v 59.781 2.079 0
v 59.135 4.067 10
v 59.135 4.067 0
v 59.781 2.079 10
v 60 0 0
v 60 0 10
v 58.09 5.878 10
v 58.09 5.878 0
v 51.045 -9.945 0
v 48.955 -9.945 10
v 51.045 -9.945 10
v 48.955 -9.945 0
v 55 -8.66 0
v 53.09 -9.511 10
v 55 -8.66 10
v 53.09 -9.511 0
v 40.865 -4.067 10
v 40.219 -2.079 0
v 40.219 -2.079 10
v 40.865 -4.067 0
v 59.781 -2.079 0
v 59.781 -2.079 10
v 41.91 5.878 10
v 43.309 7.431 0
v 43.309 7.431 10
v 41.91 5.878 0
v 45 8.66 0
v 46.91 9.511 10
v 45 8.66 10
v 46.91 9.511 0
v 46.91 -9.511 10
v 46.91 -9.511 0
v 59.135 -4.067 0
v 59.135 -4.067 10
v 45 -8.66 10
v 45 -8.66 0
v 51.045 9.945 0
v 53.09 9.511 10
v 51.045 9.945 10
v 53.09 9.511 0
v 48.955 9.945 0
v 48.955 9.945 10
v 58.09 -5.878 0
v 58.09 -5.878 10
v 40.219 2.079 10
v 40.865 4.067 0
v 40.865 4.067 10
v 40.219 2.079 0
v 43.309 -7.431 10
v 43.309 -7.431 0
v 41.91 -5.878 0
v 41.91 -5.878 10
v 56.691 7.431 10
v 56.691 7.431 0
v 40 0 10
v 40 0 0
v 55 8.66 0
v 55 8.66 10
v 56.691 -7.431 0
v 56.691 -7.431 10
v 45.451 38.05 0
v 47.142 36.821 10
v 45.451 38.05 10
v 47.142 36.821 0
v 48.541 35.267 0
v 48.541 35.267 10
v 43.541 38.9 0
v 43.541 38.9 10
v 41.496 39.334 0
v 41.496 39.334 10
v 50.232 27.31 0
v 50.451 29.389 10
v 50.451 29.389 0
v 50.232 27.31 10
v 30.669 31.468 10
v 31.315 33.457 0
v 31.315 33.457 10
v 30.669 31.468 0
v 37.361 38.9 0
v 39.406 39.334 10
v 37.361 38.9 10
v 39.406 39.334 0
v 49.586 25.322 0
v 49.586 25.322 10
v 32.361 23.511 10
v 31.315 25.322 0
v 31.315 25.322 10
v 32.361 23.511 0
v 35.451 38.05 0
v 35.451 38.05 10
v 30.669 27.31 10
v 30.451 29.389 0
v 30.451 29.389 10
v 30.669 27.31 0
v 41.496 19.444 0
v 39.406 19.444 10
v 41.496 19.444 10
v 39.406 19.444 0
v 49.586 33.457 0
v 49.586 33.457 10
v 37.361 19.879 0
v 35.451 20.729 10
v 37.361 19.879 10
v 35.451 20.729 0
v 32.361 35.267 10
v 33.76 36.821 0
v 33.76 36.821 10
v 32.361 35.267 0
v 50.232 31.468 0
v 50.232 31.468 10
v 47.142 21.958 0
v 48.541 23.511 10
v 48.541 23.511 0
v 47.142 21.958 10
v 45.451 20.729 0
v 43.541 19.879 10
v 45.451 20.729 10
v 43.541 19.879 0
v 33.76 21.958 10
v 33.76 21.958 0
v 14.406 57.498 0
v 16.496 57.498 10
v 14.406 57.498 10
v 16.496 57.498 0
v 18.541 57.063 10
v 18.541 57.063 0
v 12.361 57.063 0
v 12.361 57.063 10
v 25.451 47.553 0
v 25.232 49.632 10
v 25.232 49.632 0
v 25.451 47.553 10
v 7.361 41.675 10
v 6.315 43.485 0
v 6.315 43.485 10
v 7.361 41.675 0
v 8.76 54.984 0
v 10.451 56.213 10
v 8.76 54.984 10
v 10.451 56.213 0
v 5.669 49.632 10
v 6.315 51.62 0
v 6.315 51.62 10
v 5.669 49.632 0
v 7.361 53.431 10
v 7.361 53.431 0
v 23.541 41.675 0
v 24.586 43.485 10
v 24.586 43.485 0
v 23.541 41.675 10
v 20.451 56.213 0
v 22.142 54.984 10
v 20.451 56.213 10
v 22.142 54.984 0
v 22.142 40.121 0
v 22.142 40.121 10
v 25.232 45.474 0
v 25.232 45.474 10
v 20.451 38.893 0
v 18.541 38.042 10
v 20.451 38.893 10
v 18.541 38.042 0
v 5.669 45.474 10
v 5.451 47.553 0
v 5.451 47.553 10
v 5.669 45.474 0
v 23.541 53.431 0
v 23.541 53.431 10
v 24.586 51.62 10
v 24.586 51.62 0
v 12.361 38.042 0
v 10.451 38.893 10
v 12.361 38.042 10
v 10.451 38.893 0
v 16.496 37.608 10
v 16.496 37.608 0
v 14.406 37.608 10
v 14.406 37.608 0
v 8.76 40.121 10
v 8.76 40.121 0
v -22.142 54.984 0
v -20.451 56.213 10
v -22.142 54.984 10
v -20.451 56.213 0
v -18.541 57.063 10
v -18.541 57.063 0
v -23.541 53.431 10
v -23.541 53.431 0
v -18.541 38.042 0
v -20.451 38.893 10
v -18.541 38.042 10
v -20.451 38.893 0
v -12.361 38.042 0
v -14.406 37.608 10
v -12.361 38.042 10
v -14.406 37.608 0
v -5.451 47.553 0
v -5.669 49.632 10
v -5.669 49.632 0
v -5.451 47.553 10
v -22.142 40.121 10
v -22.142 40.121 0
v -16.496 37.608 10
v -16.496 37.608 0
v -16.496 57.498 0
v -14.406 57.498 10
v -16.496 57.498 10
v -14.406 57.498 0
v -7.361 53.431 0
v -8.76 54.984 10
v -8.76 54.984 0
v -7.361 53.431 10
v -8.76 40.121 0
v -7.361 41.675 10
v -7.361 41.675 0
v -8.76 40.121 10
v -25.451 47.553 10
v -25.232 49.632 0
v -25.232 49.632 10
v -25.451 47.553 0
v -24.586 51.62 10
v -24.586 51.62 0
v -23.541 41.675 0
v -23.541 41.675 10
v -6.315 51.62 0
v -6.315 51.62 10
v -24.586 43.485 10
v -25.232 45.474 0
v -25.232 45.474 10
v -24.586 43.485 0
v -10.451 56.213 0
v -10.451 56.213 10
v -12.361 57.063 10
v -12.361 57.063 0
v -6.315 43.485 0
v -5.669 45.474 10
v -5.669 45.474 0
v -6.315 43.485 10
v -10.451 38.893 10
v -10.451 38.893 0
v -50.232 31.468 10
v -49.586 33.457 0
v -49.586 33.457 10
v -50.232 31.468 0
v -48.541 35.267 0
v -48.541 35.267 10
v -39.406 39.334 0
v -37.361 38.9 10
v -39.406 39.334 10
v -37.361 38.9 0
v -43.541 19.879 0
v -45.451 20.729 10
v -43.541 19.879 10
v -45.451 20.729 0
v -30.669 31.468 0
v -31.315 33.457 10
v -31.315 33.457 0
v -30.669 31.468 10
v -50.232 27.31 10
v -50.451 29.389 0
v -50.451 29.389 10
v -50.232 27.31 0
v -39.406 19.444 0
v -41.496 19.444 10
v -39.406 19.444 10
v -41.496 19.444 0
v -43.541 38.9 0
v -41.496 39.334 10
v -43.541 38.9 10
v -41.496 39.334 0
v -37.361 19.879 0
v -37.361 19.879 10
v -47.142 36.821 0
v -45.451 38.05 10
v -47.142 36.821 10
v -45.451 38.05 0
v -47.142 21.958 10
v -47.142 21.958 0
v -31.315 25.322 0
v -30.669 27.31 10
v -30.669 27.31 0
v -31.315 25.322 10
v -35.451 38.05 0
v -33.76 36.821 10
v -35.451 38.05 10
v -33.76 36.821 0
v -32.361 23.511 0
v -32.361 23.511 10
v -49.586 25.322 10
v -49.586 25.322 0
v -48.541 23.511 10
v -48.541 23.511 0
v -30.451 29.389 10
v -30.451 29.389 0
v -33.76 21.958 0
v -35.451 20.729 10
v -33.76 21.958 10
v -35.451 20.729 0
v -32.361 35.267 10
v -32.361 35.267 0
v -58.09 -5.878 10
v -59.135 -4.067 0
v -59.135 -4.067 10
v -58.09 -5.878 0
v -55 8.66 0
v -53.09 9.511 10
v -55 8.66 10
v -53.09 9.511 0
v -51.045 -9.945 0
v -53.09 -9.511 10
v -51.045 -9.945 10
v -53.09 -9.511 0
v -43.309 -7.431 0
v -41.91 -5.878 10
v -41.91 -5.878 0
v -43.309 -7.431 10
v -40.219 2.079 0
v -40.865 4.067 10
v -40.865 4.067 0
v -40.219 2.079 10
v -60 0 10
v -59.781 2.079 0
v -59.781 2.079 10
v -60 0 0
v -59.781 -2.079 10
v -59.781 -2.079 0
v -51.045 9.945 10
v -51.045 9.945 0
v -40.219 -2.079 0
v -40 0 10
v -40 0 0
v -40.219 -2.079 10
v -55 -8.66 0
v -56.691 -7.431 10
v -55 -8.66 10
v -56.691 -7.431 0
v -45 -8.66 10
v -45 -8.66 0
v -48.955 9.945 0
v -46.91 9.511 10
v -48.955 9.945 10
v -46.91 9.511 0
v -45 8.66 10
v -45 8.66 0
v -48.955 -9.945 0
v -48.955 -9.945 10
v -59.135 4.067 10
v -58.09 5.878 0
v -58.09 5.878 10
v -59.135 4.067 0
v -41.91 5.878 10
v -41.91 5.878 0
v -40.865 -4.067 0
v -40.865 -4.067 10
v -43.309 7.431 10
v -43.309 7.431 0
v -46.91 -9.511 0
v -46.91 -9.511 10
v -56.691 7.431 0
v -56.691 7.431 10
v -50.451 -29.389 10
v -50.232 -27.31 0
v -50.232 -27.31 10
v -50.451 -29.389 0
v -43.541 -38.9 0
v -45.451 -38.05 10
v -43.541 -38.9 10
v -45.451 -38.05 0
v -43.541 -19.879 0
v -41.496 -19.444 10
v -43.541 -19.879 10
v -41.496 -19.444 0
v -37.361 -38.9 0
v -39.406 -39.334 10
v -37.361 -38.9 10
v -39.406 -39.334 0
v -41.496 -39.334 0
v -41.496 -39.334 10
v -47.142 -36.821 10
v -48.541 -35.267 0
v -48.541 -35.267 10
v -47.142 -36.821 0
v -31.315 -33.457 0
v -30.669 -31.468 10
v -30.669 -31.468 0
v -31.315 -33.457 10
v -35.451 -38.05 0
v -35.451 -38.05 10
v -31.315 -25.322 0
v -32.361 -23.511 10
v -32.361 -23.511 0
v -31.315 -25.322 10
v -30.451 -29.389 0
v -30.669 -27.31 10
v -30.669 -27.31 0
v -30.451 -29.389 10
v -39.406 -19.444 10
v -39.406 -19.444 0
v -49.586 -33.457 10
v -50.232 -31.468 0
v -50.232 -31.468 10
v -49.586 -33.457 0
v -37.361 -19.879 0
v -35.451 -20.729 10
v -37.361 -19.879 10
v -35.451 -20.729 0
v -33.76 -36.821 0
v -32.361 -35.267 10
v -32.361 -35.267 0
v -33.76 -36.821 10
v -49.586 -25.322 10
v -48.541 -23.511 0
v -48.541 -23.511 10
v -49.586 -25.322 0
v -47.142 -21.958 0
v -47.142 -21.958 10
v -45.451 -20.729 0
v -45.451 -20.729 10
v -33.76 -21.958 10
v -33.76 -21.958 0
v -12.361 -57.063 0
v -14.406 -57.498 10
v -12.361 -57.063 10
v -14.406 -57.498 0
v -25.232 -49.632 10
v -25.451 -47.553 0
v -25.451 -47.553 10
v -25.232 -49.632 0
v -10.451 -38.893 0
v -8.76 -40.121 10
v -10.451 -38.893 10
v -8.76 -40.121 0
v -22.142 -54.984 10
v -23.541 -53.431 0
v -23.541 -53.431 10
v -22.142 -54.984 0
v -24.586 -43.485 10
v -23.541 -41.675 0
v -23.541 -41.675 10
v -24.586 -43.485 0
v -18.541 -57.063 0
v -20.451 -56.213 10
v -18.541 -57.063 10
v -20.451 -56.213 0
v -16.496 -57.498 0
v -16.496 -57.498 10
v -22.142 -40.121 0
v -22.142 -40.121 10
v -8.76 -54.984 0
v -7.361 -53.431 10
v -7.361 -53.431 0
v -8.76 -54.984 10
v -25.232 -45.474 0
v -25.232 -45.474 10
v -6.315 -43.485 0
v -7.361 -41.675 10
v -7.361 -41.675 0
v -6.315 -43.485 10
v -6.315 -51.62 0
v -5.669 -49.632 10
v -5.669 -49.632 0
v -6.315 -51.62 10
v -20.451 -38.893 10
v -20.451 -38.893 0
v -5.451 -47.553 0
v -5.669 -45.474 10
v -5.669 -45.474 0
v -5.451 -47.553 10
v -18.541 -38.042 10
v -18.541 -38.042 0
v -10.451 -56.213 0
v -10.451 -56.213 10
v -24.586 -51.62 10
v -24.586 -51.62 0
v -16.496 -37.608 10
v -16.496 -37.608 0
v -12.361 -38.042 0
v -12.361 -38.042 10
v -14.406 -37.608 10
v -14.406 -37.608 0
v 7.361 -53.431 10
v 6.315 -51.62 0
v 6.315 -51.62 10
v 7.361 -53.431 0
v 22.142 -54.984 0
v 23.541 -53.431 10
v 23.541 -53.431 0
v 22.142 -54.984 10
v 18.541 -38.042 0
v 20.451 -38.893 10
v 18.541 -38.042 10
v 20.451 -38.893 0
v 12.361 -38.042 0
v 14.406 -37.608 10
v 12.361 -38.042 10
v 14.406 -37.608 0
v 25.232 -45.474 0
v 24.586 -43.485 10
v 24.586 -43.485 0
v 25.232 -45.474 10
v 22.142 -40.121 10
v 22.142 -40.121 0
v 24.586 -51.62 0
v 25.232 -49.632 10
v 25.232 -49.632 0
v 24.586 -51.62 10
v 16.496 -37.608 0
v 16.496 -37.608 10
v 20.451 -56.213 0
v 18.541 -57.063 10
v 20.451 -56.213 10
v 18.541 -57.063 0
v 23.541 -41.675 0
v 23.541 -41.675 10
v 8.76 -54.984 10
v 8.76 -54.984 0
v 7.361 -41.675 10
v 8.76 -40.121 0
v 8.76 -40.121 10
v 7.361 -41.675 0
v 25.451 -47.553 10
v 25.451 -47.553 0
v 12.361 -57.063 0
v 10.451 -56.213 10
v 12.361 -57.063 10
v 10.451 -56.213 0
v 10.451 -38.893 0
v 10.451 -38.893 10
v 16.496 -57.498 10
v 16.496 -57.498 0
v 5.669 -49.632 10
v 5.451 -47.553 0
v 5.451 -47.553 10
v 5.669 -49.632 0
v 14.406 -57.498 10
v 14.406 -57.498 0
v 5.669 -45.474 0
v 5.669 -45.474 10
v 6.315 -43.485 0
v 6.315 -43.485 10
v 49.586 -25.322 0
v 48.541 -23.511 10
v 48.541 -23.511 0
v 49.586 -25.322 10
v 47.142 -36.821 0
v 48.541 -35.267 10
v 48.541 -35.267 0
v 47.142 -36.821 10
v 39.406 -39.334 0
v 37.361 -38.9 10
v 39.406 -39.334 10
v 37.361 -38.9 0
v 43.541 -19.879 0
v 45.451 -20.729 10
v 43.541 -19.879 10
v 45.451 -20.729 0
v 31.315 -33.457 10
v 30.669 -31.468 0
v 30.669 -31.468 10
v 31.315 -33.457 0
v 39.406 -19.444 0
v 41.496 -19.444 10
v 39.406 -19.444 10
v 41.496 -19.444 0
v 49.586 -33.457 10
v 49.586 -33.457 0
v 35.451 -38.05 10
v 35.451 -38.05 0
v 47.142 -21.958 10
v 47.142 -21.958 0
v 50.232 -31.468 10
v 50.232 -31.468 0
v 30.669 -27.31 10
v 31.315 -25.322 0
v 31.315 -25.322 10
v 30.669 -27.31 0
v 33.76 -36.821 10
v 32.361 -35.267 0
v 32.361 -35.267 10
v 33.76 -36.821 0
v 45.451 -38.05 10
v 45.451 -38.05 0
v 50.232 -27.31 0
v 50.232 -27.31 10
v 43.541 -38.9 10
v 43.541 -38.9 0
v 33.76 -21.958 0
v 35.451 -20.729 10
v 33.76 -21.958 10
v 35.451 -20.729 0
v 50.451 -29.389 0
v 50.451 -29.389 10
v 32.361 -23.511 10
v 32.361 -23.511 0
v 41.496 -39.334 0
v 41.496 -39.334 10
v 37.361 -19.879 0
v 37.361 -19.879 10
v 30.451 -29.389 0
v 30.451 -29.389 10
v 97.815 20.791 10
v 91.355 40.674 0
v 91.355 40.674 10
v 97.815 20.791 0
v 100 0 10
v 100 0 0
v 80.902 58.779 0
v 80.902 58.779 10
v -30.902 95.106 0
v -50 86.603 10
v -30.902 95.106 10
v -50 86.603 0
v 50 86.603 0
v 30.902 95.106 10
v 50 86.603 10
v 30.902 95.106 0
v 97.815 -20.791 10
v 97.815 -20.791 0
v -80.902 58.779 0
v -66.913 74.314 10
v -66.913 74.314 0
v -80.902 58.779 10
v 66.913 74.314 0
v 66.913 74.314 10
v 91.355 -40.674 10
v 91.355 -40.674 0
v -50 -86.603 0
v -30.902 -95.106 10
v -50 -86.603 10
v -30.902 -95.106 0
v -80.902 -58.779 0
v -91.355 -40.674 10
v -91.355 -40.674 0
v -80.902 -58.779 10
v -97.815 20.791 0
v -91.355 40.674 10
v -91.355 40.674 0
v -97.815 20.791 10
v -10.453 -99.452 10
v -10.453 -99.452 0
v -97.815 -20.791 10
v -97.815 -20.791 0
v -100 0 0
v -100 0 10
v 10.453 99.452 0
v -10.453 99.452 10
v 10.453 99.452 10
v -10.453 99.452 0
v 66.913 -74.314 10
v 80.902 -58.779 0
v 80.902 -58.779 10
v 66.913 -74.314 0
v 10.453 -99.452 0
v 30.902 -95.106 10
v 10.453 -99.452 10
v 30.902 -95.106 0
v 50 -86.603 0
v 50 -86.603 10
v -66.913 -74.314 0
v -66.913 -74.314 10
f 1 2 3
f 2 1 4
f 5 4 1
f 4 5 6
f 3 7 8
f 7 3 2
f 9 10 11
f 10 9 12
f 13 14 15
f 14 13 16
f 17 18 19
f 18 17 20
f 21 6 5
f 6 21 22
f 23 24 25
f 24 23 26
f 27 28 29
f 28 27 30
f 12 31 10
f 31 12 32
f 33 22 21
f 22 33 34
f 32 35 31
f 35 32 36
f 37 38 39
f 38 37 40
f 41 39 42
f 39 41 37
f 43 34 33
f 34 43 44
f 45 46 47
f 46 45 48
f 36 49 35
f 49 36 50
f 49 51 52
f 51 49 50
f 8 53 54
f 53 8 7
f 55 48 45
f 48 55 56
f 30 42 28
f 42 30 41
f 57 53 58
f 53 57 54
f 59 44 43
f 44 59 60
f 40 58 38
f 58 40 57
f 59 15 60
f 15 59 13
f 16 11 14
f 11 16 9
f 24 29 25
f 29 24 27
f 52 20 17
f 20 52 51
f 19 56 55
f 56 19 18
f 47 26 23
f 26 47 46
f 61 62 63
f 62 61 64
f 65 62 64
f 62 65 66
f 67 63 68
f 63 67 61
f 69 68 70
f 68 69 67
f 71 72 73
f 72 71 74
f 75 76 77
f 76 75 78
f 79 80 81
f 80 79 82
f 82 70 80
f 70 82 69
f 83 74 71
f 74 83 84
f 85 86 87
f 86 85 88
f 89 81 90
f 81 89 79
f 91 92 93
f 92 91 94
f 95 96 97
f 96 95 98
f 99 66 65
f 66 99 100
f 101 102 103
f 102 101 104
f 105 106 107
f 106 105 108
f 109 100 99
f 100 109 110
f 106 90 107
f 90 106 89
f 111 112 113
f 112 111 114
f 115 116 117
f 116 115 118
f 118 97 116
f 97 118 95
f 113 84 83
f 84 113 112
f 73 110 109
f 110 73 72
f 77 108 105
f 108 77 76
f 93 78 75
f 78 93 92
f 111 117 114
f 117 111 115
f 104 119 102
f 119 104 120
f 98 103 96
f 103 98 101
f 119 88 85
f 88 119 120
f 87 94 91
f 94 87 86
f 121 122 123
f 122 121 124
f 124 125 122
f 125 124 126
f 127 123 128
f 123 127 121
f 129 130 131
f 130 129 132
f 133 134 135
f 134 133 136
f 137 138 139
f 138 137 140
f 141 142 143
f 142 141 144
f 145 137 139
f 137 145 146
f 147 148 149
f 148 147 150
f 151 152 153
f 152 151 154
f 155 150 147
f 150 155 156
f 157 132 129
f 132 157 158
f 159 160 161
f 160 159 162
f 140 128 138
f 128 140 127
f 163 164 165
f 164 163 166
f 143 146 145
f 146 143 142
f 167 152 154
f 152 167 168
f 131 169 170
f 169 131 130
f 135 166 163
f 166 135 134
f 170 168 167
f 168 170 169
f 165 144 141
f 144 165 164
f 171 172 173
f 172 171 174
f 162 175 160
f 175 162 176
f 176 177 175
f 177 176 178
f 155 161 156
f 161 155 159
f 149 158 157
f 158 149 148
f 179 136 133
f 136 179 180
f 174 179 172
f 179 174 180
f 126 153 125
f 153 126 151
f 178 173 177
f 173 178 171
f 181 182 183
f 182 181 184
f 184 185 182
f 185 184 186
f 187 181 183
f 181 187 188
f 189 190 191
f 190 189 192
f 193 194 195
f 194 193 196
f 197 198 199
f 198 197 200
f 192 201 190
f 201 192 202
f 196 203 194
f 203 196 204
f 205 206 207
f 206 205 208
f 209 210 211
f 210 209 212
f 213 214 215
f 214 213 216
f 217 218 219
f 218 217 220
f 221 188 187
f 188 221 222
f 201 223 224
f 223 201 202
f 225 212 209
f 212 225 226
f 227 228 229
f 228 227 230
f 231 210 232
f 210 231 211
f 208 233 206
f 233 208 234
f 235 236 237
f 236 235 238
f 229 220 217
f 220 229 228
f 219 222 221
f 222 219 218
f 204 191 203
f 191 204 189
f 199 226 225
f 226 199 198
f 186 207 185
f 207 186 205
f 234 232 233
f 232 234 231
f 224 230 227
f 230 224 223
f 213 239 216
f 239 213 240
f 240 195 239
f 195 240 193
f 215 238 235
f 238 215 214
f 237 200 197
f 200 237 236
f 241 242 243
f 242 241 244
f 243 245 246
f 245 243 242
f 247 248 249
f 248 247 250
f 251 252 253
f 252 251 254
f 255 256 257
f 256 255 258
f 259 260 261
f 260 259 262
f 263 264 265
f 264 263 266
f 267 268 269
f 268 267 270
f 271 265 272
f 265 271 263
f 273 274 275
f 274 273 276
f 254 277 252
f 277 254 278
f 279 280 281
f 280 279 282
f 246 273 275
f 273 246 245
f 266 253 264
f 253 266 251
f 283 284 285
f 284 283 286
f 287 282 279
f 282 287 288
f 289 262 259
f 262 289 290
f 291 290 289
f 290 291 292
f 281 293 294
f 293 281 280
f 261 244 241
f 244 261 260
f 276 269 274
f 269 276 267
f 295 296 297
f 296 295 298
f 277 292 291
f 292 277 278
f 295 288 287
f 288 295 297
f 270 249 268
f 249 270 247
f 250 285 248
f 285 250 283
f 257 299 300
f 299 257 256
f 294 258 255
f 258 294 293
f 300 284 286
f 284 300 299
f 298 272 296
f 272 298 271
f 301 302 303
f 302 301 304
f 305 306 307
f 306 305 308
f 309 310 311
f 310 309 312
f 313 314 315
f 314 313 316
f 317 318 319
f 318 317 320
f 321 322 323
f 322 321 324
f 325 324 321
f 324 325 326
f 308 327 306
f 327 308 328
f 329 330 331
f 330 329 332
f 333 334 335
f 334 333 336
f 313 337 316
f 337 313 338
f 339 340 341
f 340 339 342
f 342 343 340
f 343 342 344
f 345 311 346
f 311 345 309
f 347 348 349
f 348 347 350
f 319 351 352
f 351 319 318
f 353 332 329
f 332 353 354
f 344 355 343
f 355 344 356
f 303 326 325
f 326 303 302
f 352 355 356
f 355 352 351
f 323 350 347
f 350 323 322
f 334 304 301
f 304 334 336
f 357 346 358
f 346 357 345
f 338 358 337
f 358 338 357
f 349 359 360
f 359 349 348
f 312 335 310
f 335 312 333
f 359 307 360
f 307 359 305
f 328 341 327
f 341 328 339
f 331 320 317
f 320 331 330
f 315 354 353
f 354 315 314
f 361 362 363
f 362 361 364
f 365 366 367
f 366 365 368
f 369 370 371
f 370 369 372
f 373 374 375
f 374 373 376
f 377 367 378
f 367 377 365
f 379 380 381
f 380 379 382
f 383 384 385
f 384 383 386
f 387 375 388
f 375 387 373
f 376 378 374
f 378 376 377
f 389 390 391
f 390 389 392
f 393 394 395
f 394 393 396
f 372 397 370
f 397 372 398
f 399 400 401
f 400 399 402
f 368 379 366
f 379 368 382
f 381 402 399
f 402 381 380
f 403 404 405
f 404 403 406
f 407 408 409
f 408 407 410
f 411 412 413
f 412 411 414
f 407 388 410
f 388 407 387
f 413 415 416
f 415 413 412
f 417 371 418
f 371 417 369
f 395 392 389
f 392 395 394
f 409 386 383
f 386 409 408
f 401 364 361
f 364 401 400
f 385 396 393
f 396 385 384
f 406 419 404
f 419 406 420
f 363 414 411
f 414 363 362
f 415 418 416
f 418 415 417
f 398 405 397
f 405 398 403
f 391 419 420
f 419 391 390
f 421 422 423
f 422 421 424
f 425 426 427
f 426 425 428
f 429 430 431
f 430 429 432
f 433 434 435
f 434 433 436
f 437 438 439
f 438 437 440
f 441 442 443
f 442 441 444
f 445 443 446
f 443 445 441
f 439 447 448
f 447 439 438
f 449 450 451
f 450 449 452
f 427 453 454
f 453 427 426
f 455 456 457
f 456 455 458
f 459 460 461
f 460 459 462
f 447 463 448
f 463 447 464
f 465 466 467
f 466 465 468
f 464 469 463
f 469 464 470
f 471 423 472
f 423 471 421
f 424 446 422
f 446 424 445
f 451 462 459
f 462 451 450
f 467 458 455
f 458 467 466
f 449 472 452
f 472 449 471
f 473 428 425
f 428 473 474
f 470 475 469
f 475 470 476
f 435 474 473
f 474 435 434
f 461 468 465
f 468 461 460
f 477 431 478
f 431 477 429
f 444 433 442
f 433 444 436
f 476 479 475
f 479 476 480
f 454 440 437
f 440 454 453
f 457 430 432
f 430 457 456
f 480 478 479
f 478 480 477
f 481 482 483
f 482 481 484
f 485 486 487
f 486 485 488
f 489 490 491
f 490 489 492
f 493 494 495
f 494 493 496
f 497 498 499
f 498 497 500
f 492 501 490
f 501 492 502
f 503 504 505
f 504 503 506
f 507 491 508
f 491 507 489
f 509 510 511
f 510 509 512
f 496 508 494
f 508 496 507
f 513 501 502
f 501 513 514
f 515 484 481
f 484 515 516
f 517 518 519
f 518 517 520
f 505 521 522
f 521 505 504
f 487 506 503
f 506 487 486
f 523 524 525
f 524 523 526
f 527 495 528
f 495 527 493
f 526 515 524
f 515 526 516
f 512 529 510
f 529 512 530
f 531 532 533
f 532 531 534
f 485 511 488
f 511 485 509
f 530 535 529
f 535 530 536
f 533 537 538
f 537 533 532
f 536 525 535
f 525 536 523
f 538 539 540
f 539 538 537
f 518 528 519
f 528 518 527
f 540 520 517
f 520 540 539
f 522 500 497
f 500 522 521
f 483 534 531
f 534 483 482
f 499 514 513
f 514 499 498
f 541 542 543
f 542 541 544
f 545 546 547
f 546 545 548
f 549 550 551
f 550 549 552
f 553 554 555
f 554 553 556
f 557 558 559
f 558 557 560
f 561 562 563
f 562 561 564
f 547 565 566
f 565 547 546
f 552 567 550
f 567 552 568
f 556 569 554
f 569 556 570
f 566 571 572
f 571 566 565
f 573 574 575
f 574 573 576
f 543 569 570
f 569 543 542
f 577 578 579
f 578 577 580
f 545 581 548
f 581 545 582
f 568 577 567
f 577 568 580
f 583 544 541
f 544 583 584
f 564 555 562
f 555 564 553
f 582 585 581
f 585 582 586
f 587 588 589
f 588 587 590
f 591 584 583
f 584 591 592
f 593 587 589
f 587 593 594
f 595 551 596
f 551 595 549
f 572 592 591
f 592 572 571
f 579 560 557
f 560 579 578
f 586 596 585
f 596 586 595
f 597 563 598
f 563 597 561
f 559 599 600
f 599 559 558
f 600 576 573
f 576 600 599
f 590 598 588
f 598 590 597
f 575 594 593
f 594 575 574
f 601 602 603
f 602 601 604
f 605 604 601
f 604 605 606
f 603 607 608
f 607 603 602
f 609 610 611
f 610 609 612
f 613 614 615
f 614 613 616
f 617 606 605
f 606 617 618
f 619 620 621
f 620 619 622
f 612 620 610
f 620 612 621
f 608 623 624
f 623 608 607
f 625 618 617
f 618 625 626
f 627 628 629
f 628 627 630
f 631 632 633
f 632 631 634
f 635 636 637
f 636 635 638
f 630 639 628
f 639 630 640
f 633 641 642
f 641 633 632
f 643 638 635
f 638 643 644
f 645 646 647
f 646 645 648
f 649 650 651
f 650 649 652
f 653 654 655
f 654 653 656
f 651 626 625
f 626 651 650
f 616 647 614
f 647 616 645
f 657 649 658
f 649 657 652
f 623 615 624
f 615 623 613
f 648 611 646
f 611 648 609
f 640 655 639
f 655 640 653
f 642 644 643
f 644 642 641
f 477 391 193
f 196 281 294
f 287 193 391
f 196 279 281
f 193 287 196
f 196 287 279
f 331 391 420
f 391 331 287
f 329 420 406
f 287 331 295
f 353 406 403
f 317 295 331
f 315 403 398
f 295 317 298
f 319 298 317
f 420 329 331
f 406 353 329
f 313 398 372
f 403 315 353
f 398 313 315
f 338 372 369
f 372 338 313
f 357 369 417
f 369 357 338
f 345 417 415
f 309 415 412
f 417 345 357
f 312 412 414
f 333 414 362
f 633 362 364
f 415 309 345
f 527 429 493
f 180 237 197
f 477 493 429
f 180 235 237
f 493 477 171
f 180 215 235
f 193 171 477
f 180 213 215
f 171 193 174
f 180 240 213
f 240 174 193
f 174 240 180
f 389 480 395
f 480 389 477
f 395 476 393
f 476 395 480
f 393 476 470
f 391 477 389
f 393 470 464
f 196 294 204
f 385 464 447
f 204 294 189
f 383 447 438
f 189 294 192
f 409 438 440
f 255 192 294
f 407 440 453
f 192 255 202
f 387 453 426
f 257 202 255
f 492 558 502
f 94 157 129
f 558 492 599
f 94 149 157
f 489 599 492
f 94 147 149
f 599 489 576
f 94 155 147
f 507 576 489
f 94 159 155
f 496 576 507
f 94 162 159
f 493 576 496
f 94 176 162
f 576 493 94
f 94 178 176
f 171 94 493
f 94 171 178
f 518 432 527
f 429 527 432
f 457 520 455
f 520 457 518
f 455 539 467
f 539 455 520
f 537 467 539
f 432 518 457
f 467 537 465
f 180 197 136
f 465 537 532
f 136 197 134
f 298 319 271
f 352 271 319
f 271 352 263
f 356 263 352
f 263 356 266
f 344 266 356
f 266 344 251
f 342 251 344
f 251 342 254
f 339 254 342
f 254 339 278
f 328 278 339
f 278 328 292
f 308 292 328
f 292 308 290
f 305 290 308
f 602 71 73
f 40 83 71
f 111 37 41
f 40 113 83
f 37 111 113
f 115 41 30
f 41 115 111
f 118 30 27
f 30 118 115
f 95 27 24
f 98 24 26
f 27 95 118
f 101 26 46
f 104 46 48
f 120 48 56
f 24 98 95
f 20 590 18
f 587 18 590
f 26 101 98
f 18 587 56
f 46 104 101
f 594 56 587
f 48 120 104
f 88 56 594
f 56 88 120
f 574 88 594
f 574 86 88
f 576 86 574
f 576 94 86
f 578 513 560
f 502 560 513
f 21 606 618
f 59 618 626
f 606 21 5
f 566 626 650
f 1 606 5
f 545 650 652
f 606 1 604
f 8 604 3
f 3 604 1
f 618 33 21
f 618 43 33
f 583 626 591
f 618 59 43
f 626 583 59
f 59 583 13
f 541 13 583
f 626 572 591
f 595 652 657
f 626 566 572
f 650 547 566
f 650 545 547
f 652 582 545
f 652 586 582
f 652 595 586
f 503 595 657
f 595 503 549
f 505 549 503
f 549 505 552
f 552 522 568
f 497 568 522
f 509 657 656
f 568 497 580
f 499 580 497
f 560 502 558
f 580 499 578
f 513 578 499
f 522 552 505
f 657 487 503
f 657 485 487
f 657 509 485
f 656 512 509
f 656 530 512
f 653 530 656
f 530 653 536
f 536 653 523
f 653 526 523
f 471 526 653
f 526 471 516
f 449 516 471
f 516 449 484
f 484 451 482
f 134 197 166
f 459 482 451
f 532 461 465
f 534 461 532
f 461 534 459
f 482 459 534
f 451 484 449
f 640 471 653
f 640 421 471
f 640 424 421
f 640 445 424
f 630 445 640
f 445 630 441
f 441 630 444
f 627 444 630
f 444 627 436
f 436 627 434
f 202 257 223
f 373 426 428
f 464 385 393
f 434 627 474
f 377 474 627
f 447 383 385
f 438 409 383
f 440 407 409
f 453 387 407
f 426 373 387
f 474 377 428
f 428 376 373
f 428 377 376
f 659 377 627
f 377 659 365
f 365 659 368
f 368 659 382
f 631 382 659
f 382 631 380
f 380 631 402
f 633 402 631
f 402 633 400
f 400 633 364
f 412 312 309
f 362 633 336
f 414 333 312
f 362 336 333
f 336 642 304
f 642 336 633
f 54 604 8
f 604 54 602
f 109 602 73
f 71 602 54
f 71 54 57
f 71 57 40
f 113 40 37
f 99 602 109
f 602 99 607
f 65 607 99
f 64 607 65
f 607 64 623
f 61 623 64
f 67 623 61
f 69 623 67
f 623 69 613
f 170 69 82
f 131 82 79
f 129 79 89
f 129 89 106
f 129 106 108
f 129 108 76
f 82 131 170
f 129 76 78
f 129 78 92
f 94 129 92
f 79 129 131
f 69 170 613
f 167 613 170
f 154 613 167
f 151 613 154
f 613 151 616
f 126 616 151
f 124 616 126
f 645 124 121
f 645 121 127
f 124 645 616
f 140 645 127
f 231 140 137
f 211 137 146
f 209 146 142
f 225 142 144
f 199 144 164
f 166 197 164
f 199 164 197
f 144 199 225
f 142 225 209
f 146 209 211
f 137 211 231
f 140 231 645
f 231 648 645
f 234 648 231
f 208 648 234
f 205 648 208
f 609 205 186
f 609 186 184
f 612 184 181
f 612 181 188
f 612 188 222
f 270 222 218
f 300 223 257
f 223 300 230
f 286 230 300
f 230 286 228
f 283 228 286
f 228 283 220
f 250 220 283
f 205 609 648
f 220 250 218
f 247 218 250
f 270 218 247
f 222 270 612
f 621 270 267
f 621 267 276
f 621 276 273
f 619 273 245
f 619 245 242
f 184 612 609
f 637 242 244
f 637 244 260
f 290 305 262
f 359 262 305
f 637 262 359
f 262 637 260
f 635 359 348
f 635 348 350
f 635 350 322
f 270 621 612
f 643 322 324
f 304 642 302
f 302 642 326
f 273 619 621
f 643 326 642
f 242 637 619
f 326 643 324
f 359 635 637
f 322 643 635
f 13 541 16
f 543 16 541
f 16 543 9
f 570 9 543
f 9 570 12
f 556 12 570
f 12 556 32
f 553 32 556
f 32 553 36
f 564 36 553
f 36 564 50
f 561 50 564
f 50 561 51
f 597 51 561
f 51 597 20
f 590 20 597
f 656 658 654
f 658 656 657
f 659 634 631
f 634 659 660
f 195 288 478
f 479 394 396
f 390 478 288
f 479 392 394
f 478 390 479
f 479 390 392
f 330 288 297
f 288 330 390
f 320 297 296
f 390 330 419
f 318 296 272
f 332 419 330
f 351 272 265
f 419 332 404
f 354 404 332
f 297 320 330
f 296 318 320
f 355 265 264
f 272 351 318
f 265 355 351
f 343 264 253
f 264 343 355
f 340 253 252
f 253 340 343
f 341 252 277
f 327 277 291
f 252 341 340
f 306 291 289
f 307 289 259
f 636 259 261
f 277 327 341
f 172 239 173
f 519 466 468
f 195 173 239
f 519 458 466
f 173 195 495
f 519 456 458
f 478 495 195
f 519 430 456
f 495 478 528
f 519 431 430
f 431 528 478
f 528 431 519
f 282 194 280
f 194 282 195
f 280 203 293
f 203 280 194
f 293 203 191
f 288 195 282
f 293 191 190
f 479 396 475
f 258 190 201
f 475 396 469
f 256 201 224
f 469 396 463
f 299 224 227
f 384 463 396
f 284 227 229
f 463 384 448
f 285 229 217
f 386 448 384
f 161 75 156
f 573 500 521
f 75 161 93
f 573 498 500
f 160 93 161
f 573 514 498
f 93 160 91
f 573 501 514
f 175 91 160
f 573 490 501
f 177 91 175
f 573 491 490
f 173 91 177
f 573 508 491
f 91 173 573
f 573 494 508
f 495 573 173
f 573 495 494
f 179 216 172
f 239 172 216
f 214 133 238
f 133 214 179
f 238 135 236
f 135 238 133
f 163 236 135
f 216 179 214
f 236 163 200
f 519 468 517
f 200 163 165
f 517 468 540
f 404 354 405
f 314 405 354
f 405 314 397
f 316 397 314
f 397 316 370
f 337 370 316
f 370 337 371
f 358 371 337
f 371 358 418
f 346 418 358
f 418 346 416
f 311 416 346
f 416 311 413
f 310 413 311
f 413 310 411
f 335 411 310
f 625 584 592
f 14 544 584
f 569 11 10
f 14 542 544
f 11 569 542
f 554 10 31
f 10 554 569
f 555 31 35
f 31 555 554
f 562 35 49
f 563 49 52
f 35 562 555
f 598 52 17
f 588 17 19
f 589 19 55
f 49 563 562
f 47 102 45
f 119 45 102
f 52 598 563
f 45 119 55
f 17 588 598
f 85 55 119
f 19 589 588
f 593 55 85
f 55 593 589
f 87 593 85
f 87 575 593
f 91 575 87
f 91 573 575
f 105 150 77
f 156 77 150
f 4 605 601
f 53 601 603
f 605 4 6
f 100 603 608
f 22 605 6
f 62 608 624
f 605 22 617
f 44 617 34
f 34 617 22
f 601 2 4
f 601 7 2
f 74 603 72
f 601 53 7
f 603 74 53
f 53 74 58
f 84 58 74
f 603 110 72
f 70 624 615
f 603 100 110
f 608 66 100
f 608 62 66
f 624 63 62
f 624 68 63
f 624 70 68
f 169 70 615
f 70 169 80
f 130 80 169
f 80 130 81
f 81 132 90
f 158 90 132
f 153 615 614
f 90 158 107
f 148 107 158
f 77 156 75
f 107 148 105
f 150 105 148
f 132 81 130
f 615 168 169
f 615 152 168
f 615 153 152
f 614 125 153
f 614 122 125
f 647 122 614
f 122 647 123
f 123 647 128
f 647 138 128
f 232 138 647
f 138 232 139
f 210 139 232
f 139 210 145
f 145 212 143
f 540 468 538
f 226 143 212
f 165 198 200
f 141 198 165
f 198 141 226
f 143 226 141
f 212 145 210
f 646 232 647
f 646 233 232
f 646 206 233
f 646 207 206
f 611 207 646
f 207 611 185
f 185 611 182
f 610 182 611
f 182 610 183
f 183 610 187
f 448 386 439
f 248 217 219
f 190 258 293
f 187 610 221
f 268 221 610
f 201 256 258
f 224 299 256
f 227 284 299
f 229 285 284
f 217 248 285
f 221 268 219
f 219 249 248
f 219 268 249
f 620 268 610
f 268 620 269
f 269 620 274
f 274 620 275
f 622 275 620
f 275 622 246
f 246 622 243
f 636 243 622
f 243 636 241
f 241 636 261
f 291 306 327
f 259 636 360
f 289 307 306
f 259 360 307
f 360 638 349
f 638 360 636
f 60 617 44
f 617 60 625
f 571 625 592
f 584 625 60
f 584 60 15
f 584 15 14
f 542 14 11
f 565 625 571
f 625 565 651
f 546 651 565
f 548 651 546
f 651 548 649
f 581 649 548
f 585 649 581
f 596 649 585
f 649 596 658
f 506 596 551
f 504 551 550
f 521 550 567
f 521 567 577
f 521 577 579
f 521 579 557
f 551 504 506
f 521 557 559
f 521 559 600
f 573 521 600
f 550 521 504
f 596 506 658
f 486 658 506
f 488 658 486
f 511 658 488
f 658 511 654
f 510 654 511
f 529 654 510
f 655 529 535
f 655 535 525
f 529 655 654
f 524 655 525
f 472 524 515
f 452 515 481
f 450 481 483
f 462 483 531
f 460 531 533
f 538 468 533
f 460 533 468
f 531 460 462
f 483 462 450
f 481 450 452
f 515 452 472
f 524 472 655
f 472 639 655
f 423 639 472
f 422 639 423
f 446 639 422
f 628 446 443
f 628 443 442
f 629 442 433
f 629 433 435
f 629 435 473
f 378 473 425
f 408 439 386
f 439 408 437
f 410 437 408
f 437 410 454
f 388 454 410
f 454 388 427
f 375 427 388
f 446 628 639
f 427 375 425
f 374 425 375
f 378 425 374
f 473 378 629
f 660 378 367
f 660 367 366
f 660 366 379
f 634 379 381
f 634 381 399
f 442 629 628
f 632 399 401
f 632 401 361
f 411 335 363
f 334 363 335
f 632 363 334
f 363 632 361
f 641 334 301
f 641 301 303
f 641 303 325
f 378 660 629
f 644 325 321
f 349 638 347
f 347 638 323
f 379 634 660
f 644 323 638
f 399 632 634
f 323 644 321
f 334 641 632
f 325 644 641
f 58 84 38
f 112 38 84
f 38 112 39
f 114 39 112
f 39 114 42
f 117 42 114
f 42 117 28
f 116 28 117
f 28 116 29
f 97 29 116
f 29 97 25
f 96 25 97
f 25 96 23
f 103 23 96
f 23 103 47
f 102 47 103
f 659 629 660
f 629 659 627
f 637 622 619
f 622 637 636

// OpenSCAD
module roata(raza,grosime,raza_gaura,nr_gauri)
{
    difference(){
      cylinder(h=grosime,r=raza);
        for(i=[0:360/nr_gauri:359])  
          rotate([0,0,i])
          translate([raza/2,0,-1])
      cylinder(r=raza_gaura,h=grosime+2);
    }
}
rotate([0,0,$t*360])

roata(raza=100,grosime=10,raza_gaura=10,nr_gauri=10);
